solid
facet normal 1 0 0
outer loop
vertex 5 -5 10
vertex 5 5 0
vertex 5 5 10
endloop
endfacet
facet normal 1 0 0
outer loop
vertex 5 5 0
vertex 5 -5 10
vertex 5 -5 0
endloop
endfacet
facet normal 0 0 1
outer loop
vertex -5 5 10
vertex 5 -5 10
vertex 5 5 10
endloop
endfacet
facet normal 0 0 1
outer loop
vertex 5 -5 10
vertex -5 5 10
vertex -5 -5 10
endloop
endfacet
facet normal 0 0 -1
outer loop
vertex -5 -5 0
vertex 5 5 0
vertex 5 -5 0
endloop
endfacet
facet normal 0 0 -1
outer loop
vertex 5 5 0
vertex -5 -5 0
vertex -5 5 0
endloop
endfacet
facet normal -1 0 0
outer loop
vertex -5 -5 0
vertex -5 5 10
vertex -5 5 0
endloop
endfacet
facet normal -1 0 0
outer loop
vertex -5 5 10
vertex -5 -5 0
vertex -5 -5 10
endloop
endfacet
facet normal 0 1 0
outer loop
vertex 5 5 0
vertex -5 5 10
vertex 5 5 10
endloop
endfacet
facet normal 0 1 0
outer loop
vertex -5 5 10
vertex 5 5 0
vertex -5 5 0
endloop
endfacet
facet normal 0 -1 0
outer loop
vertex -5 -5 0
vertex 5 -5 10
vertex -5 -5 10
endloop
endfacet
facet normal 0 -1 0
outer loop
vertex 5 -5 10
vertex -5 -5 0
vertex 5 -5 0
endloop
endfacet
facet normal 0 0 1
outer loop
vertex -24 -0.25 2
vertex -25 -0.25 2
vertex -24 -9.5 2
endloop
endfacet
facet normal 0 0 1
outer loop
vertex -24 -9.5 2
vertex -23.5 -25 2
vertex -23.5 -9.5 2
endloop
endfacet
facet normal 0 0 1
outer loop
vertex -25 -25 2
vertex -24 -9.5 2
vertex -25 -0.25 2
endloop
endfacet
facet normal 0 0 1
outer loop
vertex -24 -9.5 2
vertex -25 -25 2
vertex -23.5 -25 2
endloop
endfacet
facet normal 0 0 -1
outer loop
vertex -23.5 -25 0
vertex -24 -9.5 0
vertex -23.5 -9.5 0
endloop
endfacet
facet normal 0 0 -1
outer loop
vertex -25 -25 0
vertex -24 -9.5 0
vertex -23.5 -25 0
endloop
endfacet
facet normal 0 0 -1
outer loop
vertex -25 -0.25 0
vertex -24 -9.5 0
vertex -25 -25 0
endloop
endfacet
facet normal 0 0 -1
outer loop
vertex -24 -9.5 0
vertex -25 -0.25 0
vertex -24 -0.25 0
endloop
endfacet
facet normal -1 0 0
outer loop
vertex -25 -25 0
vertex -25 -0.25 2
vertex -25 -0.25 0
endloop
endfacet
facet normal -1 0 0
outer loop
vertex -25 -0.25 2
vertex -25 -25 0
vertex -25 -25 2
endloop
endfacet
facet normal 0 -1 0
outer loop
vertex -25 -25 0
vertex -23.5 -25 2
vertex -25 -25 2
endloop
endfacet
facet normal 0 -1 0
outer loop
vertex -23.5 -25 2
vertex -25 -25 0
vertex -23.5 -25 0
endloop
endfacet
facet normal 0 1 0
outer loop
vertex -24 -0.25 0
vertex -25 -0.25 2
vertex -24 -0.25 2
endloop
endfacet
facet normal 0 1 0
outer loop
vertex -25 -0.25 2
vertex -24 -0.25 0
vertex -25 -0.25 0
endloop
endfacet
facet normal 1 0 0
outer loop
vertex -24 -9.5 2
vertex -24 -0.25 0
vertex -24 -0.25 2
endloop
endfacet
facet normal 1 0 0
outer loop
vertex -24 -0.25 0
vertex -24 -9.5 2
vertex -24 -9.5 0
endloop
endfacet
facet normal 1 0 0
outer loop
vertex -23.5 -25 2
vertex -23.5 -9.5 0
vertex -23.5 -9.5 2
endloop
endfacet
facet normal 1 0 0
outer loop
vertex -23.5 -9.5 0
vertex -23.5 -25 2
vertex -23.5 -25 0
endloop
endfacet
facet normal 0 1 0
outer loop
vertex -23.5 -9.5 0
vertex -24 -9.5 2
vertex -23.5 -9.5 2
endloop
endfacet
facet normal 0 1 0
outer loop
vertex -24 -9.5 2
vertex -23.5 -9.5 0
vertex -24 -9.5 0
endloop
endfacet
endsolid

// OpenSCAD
translate([0, 0, 5]) color([0,1,0,0.9]) cube([10, 10, 10], center=true);
translate([-24.75, -24.75, 1]) color([1,0,0]) cube([0.5, 0.5, 2], center=true);
translate([-24.75, -24.25, 1]) color([1,0,0]) cube([0.5, 0.5, 2], center=true);
translate([-24.75, -23.75, 1]) color([1,0,0]) cube([0.5, 0.5, 2], center=true);
translate([-24.75, -23.25, 1]) color([1,0,0]) cube([0.5, 0.5, 2], center=true);
translate([-24.75, -22.75, 1]) color([1,0,0]) cube([0.5, 0.5, 2], center=true);
translate([-24.75, -22.25, 1]) color([1,0,0]) cube([0.5, 0.5, 2], center=true);
translate([-24.75, -21.75, 1]) color([1,0,0]) cube([0.5, 0.5, 2], center=true);
translate([-24.75, -21.25, 1]) color([1,0,0]) cube([0.5, 0.5, 2], center=true);
translate([-24.75, -20.75, 1]) color([1,0,0]) cube([0.5, 0.5, 2], center=true);
translate([-24.75, -20.25, 1]) color([1,0,0]) cube([0.5, 0.5, 2], center=true);
translate([-24.75, -19.75, 1]) color([1,0,0]) cube([0.5, 0.5, 2], center=true);
translate([-24.75, -19.25, 1]) color([1,0,0]) cube([0.5, 0.5, 2], center=true);
translate([-24.75, -18.75, 1]) color([1,0,0]) cube([0.5, 0.5, 2], center=true);
translate([-24.75, -18.25, 1]) color([1,0,0]) cube([0.5, 0.5, 2], center=true);
translate([-24.75, -17.75, 1]) color([1,0,0]) cube([0.5, 0.5, 2], center=true);
translate([-24.75, -17.25, 1]) color([1,0,0]) cube([0.5, 0.5, 2], center=true);
translate([-24.75, -16.75, 1]) color([1,0,0]) cube([0.5, 0.5, 2], center=true);
translate([-24.75, -16.25, 1]) color([1,0,0]) cube([0.5, 0.5, 2], center=true);
translate([-24.75, -15.75, 1]) color([1,0,0]) cube([0.5, 0.5, 2], center=true);
translate([-24.75, -15.25, 1]) color([1,0,0]) cube([0.5, 0.5, 2], center=true);
translate([-24.75, -14.75, 1]) color([1,0,0]) cube([0.5, 0.5, 2], center=true);
translate([-24.75, -14.25, 1]) color([1,0,0]) cube([0.5, 0.5, 2], center=true);
translate([-24.75, -13.75, 1]) color([1,0,0]) cube([0.5, 0.5, 2], center=true);
translate([-24.75, -13.25, 1]) color([1,0,0]) cube([0.5, 0.5, 2], center=true);
translate([-24.75, -12.75, 1]) color([1,0,0]) cube([0.5, 0.5, 2], center=true);
translate([-24.75, -12.25, 1]) color([1,0,0]) cube([0.5, 0.5, 2], center=true);
translate([-24.75, -11.75, 1]) color([1,0,0]) cube([0.5, 0.5, 2], center=true);
translate([-24.75, -11.25, 1]) color([1,0,0]) cube([0.5, 0.5, 2], center=true);
translate([-24.75, -10.75, 1]) color([1,0,0]) cube([0.5, 0.5, 2], center=true);
translate([-24.75, -10.25, 1]) color([1,0,0]) cube([0.5, 0.5, 2], center=true);
translate([-24.75, -9.75, 1]) color([1,0,0]) cube([0.5, 0.5, 2], center=true);
translate([-24.75, -9.25, 1]) color([1,0,0]) cube([0.5, 0.5, 2], center=true);
translate([-24.75, -8.75, 1]) color([1,0,0]) cube([0.5, 0.5, 2], center=true);
translate([-24.75, -8.25, 1]) color([1,0,0]) cube([0.5, 0.5, 2], center=true);
translate([-24.75, -7.75, 1]) color([1,0,0]) cube([0.5, 0.5, 2], center=true);
translate([-24.75, -7.25, 1]) color([1,0,0]) cube([0.5, 0.5, 2], center=true);
translate([-24.75, -6.75, 1]) color([1,0,0]) cube([0.5, 0.5, 2], center=true);
translate([-24.75, -6.25, 1]) color([1,0,0]) cube([0.5, 0.5, 2], center=true);
translate([-24.75, -5.75, 1]) color([1,0,0]) cube([0.5, 0.5, 2], center=true);
translate([-24.75, -5.25, 1]) color([1,0,0]) cube([0.5, 0.5, 2], center=true);
translate([-24.75, -4.75, 1]) color([1,0,0]) cube([0.5, 0.5, 2], center=true);
translate([-24.75, -4.25, 1]) color([1,0,0]) cube([0.5, 0.5, 2], center=true);
translate([-24.75, -3.75, 1]) color([1,0,0]) cube([0.5, 0.5, 2], center=true);
translate([-24.75, -3.25, 1]) color([1,0,0]) cube([0.5, 0.5, 2], center=true);
translate([-24.75, -2.75, 1]) color([1,0,0]) cube([0.5, 0.5, 2], center=true);
translate([-24.75, -2.25, 1]) color([1,0,0]) cube([0.5, 0.5, 2], center=true);
translate([-24.75, -1.75, 1]) color([1,0,0]) cube([0.5, 0.5, 2], center=true);
translate([-24.75, -1.25, 1]) color([1,0,0]) cube([0.5, 0.5, 2], center=true);
translate([-24.75, -0.75, 1]) color([1,0,0]) cube([0.5, 0.5, 2], center=true);
translate([-24.75, -0.5, 1]) color([1,0,0]) cube([0.5, 0.5, 2], center=true);
translate([-24.25, -24.75, 1]) color([1,0,0]) cube([0.5, 0.5, 2], center=true);
translate([-24.25, -24.25, 1]) color([1,0,0]) cube([0.5, 0.5, 2], center=true);
translate([-24.25, -23.75, 1]) color([1,0,0]) cube([0.5, 0.5, 2], center=true);
translate([-24.25, -23.25, 1]) color([1,0,0]) cube([0.5, 0.5, 2], center=true);
translate([-24.25, -22.75, 1]) color([1,0,0]) cube([0.5, 0.5, 2], center=true);
translate([-24.25, -22.25, 1]) color([1,0,0]) cube([0.5, 0.5, 2], center=true);
translate([-24.25, -21.75, 1]) color([1,0,0]) cube([0.5, 0.5, 2], center=true);
translate([-24.25, -21.25, 1]) color([1,0,0]) cube([0.5, 0.5, 2], center=true);
translate([-24.25, -20.75, 1]) color([1,0,0]) cube([0.5, 0.5, 2], center=true);
translate([-24.25, -20.25, 1]) color([1,0,0]) cube([0.5, 0.5, 2], center=true);
translate([-24.25, -19.75, 1]) color([1,0,0]) cube([0.5, 0.5, 2], center=true);
translate([-24.25, -19.25, 1]) color([1,0,0]) cube([0.5, 0.5, 2], center=true);
translate([-24.25, -18.75, 1]) color([1,0,0]) cube([0.5, 0.5, 2], center=true);
translate([-24.25, -18.25, 1]) color([1,0,0]) cube([0.5, 0.5, 2], center=true);
translate([-24.25, -17.75, 1]) color([1,0,0]) cube([0.5, 0.5, 2], center=true);
translate([-24.25, -17.25, 1]) color([1,0,0]) cube([0.5, 0.5, 2], center=true);
translate([-24.25, -16.75, 1]) color([1,0,0]) cube([0.5, 0.5, 2], center=true);
translate([-24.25, -16.25, 1]) color([1,0,0]) cube([0.5, 0.5, 2], center=true);
translate([-24.25, -15.75, 1]) color([1,0,0]) cube([0.5, 0.5, 2], center=true);
translate([-24.25, -15.25, 1]) color([1,0,0]) cube([0.5, 0.5, 2], center=true);
translate([-24.25, -14.75, 1]) color([1,0,0]) cube([0.5, 0.5, 2], center=true);
translate([-24.25, -14.25, 1]) color([1,0,0]) cube([0.5, 0.5, 2], center=true);
translate([-24.25, -13.75, 1]) color([1,0,0]) cube([0.5, 0.5, 2], center=true);
translate([-24.25, -13.25, 1]) color([1,0,0]) cube([0.5, 0.5, 2], center=true);
translate([-24.25, -12.75, 1]) color([1,0,0]) cube([0.5, 0.5, 2], center=true);
translate([-24.25, -12.25, 1]) color([1,0,0]) cube([0.5, 0.5, 2], center=true);
translate([-24.25, -11.75, 1]) color([1,0,0]) cube([0.5, 0.5, 2], center=true);
translate([-24.25, -11.25, 1]) color([1,0,0]) cube([0.5, 0.5, 2], center=true);
translate([-24.25, -10.75, 1]) color([1,0,0]) cube([0.5, 0.5, 2], center=true);
translate([-24.25, -10.25, 1]) color([1,0,0]) cube([0.5, 0.5, 2], center=true);
translate([-24.25, -9.75, 1]) color([1,0,0]) cube([0.5, 0.5, 2], center=true);
translate([-24.25, -9.25, 1]) color([1,0,0]) cube([0.5, 0.5, 2], center=true);
translate([-24.25, -8.75, 1]) color([1,0,0]) cube([0.5, 0.5, 2], center=true);
translate([-24.25, -8.25, 1]) color([1,0,0]) cube([0.5, 0.5, 2], center=true);
translate([-24.25, -7.75, 1]) color([1,0,0]) cube([0.5, 0.5, 2], center=true);
translate([-24.25, -7.25, 1]) color([1,0,0]) cube([0.5, 0.5, 2], center=true);
translate([-24.25, -6.75, 1]) color([1,0,0]) cube([0.5, 0.5, 2], center=true);
translate([-24.25, -6.25, 1]) color([1,0,0]) cube([0.5, 0.5, 2], center=true);
translate([-24.25, -5.75, 1]) color([1,0,0]) cube([0.5, 0.5, 2], center=true);
translate([-24.25, -5.25, 1]) color([1,0,0]) cube([0.5, 0.5, 2], center=true);
translate([-24.25, -4.75, 1]) color([1,0,0]) cube([0.5, 0.5, 2], center=true);
translate([-24.25, -4.25, 1]) color([1,0,0]) cube([0.5, 0.5, 2], center=true);
translate([-24.25, -3.75, 1]) color([1,0,0]) cube([0.5, 0.5, 2], center=true);
translate([-24.25, -3.25, 1]) color([1,0,0]) cube([0.5, 0.5, 2], center=true);
translate([-24.25, -2.75, 1]) color([1,0,0]) cube([0.5, 0.5, 2], center=true);
translate([-24.25, -2.25, 1]) color([1,0,0]) cube([0.5, 0.5, 2], center=true);
translate([-24.25, -1.75, 1]) color([1,0,0]) cube([0.5, 0.5, 2], center=true);
translate([-24.25, -1.25, 1]) color([1,0,0]) cube([0.5, 0.5, 2], center=true);
translate([-24.25, -0.75, 1]) color([1,0,0]) cube([0.5, 0.5, 2], center=true);
translate([-24.25, -0.5, 1]) color([1,0,0]) cube([0.5, 0.5, 2], center=true);
translate([-23.75, -24.75, 1]) color([1,0,0]) cube([0.5, 0.5, 2], center=true);
translate([-23.75, -24.25, 1]) color([1,0,0]) cube([0.5, 0.5, 2], center=true);
translate([-23.75, -23.75, 1]) color([1,0,0]) cube([0.5, 0.5, 2], center=true);
translate([-23.75, -23.25, 1]) color([1,0,0]) cube([0.5, 0.5, 2], center=true);
translate([-23.75, -22.75, 1]) color([1,0,0]) cube([0.5, 0.5, 2], center=true);
translate([-23.75, -22.25, 1]) color([1,0,0]) cube([0.5, 0.5, 2], center=true);
translate([-23.75, -21.75, 1]) color([1,0,0]) cube([0.5, 0.5, 2], center=true);
translate([-23.75, -21.25, 1]) color([1,0,0]) cube([0.5, 0.5, 2], center=true);
translate([-23.75, -20.75, 1]) color([1,0,0]) cube([0.5, 0.5, 2], center=true);
translate([-23.75, -20.25, 1]) color([1,0,0]) cube([0.5, 0.5, 2], center=true);
translate([-23.75, -19.75, 1]) color([1,0,0]) cube([0.5, 0.5, 2], center=true);
translate([-23.75, -19.25, 1]) color([1,0,0]) cube([0.5, 0.5, 2], center=true);
translate([-23.75, -18.75, 1]) color([1,0,0]) cube([0.5, 0.5, 2], center=true);
translate([-23.75, -18.25, 1]) color([1,0,0]) cube([0.5, 0.5, 2], center=true);
translate([-23.75, -17.75, 1]) color([1,0,0]) cube([0.5, 0.5, 2], center=true);
translate([-23.75, -17.25, 1]) color([1,0,0]) cube([0.5, 0.5, 2], center=true);
translate([-23.75, -16.75, 1]) color([1,0,0]) cube([0.5, 0.5, 2], center=true);
translate([-23.75, -16.25, 1]) color([1,0,0]) cube([0.5, 0.5, 2], center=true);
translate([-23.75, -15.75, 1]) color([1,0,0]) cube([0.5, 0.5, 2], center=true);
translate([-23.75, -15.25, 1]) color([1,0,0]) cube([0.5, 0.5, 2], center=true);
translate([-23.75, -14.75, 1]) color([1,0,0]) cube([0.5, 0.5, 2], center=true);
translate([-23.75, -14.25, 1]) color([1,0,0]) cube([0.5, 0.5, 2], center=true);
translate([-23.75, -13.75, 1]) color([1,0,0]) cube([0.5, 0.5, 2], center=true);
translate([-23.75, -13.25, 1]) color([1,0,0]) cube([0.5, 0.5, 2], center=true);
translate([-23.75, -12.75, 1]) color([1,0,0]) cube([0.5, 0.5, 2], center=true);
translate([-23.75, -12.25, 1]) color([1,0,0]) cube([0.5, 0.5, 2], center=true);
translate([-23.75, -11.75, 1]) color([1,0,0]) cube([0.5, 0.5, 2], center=true);
translate([-23.75, -11.25, 1]) color([1,0,0]) cube([0.5, 0.5, 2], center=true);
translate([-23.75, -10.75, 1]) color([1,0,0]) cube([0.5, 0.5, 2], center=true);
translate([-23.75, -10.25, 1]) color([1,0,0]) cube([0.5, 0.5, 2], center=true);
translate([-23.75, -9.75, 1]) color([1,0,0]) cube([0.5, 0.5, 2], center=true);
